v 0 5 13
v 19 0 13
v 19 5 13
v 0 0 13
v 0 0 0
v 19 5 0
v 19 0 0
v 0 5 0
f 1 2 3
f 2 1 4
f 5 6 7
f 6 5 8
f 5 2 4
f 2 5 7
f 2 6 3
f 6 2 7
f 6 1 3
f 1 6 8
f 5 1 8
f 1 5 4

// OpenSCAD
// Generated by SolidPython 1.0.1 on 2020-07-29 00:46:56


cube(size = [19, 5, 13]);
/***********************************************
*********      SolidPython code:      **********
************************************************
 
# import packages: SolidPython
from solid import *
from solid.utils import *
from itertools import chain, combinations, permutations


class Resize:

    def __init__(self, scad_file):
        self.scad_file = scad_file
        #self.scad_file = import_scad(scad_file)
        # cone/cylinder param:
        self.r1 = 0
        self.r2 = 0
        self.h = 0
        # rectangular prism param:
        self.w = 0
        self.l = 0
        # ellipse param:
        self.r = 0

    # import OpenScad code (file name corresponds to shape)


    # classify shape + parameters
    def assign(self, param1, param2, param3):
        if self.scad_file == 'cone.scad':
            self.r1 = param1
            self.r2 = param2
            self.h = param3
        elif self.scad_file == 'cylinder.scad':
            self.r1 = param1
            self.r2 = param2
            self.h = param3
        elif self.scad_file == 'rectangularPrism.scad':
            self.h = param1
            self.l = param2
            self.w = param3
        else:
            self.r = param1
            self.h = param2

    # resize parameters
    def iterate(self):
        x = range(3, 20, 2)
        i = 1
        if self.scad_file == 'cone.scad':
            tempList = list(permutations(x, 2))
            for temp in tempList:
                param1 = temp[0]
                param2 = temp[1]
                filepath = 'produced_scad_files/' + 'cone' + str(param1) + '_' + str(param2) + '_' + '.scad'
                scad_render_to_file(cylinder(h=param1, r1=param2, r2=0), filepath)

        elif self.scad_file == 'cylinder.scad':
            tempList = list(permutations(x, 3))
            for temp in tempList:
                param1 = temp[0]
                param2 = temp[1]
                filepath = 'produced_scad_files/' + 'cylinder' + str(param1) + '_' + str(param2) + '_' + '.scad'
                scad_render_to_file(cylinder(h=param1, r1=param2, r2=param2), filepath)

        elif self.scad_file == 'rectangularPrism.scad':
            tempList = list(permutations(x, 3))
            for temp in tempList:
                param1 = temp[0]
                param2 = temp[1]
                param3 = temp[2]
                filepath = 'produced_scad_files/' + 'rectangularPrism' + str(param1) + '_' + str(param2) + '_' + str(
                    param3) + '.scad'
                scad_render_to_file(cube(size=(param1, param2, param3)), filepath)

        elif self.scad_file == 'ellipse.scad':
            tempList = list(permutations(x, 4))
            for temp in tempList:
                param1 = temp[0]
                param2 = temp[1]
                param3 = temp[2]
                param4 = temp[3]
                filepath = 'produced_scad_files/' + 'ellipse' + str(param1) + '_' + str(param2) + '_' + str(param3) + '_' + str(param4) + '.scad'
                scad_render_to_file(scale([param1, param2, param3])(sphere(r=param4)), filepath)

    def render_to_scadfile(self):
        scad_render_to_file(scad, 'example.scad') 
 
************************************************/
